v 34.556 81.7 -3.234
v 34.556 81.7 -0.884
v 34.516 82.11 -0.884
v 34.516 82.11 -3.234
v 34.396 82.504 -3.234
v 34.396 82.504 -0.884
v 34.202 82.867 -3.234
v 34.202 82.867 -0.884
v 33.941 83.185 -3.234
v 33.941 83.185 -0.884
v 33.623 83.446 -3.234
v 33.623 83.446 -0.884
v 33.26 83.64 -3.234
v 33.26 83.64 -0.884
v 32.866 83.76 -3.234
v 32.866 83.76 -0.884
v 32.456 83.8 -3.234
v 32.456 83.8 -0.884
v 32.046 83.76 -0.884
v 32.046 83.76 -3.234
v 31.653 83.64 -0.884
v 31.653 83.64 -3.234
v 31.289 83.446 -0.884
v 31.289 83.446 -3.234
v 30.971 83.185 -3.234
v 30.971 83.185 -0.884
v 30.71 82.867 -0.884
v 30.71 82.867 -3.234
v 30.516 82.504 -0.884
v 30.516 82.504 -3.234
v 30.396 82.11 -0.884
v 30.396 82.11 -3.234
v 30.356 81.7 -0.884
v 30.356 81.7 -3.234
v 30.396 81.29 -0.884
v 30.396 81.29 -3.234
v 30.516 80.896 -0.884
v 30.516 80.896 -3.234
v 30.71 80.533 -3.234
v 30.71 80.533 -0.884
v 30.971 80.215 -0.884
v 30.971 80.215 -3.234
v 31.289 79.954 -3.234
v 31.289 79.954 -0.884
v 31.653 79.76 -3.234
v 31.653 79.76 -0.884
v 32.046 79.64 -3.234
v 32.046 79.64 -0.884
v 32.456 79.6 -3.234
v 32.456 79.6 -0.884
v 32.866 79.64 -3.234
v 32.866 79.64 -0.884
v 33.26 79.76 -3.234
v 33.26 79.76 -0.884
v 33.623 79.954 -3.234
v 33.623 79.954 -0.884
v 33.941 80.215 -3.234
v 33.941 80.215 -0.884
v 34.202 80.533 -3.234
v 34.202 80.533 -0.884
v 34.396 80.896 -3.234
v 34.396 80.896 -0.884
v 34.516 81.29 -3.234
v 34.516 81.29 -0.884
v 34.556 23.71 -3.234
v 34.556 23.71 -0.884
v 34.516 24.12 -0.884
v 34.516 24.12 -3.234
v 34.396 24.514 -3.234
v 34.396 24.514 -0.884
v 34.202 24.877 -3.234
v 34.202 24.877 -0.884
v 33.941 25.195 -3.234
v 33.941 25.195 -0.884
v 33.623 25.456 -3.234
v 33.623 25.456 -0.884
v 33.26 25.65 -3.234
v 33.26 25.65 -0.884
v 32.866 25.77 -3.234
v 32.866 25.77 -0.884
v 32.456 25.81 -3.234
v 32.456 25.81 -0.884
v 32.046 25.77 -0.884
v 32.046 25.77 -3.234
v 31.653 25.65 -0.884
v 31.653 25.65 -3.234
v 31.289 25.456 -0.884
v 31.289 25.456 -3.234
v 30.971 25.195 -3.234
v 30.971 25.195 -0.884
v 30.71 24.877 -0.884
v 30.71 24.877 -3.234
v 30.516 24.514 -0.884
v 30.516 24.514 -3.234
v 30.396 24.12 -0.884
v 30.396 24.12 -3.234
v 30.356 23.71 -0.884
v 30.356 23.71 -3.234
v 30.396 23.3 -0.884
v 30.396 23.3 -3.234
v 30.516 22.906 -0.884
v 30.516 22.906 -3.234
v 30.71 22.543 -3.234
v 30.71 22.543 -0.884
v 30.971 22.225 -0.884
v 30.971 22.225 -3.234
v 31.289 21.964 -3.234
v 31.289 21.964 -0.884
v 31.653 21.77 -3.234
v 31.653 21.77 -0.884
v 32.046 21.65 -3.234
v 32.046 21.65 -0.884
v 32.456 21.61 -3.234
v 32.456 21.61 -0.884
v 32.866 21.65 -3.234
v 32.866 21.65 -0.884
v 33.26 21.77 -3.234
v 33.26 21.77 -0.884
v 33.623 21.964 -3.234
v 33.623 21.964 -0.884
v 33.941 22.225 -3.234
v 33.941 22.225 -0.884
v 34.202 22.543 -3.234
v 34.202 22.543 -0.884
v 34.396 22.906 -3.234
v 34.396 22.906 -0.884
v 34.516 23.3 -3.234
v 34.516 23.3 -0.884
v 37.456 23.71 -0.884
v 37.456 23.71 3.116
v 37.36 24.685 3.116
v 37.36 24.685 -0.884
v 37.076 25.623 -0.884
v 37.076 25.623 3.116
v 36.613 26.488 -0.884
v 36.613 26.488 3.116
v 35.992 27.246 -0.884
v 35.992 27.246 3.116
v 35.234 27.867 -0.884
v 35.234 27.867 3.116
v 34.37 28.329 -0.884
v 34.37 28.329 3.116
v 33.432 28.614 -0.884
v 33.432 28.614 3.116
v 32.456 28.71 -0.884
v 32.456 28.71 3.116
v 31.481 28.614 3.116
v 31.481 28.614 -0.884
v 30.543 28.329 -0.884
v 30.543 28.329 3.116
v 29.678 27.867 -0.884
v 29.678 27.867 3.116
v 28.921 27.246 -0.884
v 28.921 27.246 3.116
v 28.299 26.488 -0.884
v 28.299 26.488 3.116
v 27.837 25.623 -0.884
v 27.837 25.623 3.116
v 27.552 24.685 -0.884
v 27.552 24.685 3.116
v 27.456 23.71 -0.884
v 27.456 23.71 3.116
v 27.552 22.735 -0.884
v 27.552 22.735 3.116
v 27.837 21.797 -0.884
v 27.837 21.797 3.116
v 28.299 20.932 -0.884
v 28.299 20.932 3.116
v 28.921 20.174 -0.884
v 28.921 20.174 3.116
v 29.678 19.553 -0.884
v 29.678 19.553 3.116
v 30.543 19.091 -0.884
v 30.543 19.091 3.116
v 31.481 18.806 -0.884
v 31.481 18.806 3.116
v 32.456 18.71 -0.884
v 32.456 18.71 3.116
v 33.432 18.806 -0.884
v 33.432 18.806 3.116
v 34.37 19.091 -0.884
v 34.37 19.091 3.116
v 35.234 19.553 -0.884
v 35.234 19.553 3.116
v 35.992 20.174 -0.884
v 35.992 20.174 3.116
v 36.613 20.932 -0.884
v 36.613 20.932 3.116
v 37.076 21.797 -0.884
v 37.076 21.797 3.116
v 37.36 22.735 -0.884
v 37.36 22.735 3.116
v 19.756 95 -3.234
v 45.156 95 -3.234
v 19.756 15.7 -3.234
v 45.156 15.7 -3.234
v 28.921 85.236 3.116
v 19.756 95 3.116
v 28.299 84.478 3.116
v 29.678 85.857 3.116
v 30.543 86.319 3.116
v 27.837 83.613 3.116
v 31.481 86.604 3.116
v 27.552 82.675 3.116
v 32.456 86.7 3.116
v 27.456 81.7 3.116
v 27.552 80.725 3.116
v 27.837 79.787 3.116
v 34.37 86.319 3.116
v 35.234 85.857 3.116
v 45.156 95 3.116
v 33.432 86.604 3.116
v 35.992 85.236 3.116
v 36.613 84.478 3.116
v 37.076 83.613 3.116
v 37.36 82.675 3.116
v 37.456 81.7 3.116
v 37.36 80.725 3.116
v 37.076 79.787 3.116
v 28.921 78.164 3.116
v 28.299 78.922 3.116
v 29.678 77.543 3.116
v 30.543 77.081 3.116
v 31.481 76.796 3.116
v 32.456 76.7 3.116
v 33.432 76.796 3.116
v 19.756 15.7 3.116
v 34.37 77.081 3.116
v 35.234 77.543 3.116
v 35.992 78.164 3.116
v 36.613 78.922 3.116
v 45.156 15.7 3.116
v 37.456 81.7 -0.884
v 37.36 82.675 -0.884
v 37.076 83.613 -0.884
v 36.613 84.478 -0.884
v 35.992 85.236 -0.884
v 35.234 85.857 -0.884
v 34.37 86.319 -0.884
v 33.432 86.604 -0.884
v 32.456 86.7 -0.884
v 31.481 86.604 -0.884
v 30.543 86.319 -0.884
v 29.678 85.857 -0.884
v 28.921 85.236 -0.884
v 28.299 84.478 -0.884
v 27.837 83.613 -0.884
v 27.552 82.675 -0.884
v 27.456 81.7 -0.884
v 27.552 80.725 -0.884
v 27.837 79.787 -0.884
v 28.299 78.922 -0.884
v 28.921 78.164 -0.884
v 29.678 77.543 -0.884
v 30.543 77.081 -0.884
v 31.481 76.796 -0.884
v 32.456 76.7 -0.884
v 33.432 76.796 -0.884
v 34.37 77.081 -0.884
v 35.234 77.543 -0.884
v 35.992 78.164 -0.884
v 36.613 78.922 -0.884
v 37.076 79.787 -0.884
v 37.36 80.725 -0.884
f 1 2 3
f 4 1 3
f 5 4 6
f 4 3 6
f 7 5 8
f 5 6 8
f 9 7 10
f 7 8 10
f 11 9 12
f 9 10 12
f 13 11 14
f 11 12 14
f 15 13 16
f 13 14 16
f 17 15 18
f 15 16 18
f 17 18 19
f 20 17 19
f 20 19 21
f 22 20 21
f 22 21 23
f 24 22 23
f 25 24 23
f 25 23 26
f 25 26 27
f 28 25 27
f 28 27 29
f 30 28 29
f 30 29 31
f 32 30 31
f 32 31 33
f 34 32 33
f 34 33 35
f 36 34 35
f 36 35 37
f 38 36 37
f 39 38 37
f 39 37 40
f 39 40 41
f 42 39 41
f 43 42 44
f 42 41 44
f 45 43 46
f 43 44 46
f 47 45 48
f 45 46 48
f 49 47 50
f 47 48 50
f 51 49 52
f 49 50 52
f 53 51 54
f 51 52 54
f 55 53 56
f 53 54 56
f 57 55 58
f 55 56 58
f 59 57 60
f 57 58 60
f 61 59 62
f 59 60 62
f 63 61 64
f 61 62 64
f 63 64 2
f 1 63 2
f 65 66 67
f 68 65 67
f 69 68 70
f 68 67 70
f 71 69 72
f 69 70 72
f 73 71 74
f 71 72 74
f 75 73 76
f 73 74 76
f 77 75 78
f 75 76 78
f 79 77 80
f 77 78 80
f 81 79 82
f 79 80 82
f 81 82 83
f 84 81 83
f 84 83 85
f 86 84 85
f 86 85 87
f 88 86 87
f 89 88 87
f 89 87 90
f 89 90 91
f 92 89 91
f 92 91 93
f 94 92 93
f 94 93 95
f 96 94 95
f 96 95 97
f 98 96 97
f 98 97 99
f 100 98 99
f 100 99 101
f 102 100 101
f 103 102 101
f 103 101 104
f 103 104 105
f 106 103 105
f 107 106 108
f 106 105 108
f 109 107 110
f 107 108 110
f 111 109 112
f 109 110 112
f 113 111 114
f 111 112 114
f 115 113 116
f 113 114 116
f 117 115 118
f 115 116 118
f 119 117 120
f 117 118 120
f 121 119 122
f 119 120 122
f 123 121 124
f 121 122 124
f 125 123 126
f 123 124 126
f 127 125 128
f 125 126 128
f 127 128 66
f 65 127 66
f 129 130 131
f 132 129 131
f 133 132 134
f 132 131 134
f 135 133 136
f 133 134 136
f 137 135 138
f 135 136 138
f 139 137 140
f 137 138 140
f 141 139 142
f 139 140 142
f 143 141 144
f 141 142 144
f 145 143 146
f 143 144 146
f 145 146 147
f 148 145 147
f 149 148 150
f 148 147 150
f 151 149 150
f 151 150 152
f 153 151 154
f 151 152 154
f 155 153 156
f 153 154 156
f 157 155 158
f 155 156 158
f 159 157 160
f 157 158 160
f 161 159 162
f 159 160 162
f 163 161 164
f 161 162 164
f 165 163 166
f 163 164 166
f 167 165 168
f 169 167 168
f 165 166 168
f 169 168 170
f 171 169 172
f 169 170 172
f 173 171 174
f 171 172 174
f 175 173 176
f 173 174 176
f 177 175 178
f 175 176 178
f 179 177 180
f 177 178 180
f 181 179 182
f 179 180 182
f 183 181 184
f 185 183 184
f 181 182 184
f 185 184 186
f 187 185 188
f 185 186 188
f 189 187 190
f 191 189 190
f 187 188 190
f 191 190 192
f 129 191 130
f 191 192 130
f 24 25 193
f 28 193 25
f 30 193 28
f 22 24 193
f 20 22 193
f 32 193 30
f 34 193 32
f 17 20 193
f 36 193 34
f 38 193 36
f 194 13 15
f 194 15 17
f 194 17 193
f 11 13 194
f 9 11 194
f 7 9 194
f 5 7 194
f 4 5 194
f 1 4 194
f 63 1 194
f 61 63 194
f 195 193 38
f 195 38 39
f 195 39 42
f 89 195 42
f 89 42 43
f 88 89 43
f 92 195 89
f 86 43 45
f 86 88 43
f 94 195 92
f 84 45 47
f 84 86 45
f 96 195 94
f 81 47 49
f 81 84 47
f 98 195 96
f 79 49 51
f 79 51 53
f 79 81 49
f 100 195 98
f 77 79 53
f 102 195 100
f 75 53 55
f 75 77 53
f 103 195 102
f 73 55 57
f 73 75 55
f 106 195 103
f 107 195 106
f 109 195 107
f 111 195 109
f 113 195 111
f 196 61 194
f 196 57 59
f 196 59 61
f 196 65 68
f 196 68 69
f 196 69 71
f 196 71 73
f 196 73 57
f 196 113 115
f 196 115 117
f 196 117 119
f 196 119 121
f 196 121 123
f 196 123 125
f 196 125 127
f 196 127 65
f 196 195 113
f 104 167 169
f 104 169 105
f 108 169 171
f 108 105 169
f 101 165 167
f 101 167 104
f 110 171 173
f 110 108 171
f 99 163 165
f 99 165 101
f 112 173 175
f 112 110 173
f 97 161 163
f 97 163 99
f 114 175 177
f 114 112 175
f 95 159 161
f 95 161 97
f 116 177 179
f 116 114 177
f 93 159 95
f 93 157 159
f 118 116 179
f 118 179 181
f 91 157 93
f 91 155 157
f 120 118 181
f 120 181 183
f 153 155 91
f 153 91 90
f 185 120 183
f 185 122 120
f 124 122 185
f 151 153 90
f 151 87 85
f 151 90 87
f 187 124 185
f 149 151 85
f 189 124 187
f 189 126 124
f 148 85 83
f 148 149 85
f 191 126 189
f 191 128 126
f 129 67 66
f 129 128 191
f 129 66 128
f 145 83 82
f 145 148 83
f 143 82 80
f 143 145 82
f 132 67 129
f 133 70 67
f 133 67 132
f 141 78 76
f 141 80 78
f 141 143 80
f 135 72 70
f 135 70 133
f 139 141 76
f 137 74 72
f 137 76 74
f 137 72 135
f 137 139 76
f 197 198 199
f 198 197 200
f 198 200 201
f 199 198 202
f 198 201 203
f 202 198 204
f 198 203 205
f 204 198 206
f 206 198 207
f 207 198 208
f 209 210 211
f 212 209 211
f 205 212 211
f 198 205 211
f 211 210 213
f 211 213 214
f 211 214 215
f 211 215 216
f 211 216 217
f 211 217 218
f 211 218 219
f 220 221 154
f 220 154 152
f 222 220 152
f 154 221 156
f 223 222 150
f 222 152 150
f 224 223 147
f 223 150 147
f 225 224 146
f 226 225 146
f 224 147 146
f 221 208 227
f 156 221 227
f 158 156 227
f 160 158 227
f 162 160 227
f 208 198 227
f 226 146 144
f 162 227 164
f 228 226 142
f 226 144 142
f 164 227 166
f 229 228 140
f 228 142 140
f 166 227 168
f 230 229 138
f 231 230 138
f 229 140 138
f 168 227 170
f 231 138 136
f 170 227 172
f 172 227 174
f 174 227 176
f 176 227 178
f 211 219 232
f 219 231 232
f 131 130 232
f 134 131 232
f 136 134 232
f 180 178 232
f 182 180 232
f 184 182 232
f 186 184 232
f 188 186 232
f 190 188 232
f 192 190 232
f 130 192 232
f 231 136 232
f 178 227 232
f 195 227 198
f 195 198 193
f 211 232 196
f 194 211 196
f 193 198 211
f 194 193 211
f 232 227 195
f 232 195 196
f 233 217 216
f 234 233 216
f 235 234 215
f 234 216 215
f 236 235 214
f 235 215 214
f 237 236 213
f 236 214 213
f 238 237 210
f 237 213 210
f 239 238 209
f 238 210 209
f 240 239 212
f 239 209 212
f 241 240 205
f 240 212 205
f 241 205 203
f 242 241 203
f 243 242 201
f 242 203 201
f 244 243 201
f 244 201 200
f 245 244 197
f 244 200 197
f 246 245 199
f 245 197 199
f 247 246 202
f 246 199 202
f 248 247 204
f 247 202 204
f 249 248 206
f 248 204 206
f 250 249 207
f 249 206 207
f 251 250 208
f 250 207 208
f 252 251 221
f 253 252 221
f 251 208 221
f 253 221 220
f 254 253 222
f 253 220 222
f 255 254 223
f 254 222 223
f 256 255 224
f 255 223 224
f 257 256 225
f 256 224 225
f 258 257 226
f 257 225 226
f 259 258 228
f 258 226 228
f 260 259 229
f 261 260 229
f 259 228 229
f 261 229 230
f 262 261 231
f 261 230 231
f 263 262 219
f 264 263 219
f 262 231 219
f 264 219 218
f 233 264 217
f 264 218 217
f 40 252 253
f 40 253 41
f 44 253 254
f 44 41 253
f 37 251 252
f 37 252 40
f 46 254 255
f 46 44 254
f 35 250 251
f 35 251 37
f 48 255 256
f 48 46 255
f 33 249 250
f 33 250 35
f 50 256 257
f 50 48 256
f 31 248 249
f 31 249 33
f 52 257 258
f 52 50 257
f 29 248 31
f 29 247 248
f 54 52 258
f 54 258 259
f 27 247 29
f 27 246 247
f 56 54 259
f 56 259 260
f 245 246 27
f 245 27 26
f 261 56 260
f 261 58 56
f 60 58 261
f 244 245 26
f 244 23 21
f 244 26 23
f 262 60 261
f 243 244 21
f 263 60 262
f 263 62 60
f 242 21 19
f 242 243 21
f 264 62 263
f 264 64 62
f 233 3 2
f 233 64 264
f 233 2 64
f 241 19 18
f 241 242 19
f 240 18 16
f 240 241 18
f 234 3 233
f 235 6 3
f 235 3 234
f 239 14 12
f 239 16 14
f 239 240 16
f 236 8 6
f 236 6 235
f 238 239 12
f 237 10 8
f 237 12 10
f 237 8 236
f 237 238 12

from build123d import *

# Parameters (mm, degrees)
SKETCH1_W           = 25.4
SKETCH1_H           = 6.35
BOSS_EXTRUDE1_DEPTH = 100
SKETCH2_R           = 2.1
CUT_EXTRUDE1_DEPTH  = 110.906322202
SKETCH2_3_R         = 5
CUT_EXTRUDE2_DEPTH  = 4
SKETCH2_4_R         = 5
CUT_EXTRUDE3_DEPTH  = 4
SKETCH5_W           = 25.4
SKETCH5_H           = 5
SKETCH5_H_2         = 12
CUT_EXTRUDE4_DEPTH  = 110.906322202
SKETCH6_W           = 25.4
SKETCH6_H           = 3.7
CUT_EXTRUDE5_DEPTH  = 106.377415322


with BuildPart() as part:
    # Sketch1 → Boss-Extrude1 (new body)
    with BuildSketch(Plane(origin=(0, 0, 0), x_dir=(1, 0, 0), z_dir=(0, 1, 0))):
        with Locations((32.456141995, 0.058688594)):
            Rectangle(SKETCH1_W, SKETCH1_H)
    extrude(amount=BOSS_EXTRUDE1_DEPTH)

    # Sketch2 → Cut-Extrude1 (cut, through all)
    with BuildSketch(Plane.XY.offset(3.116311406)):
        with Locations((32.456141995, 81.7)):
            Circle(SKETCH2_R)
        with Locations((32.456141995, 23.71)):
            Circle(SKETCH2_R)
    extrude(amount=-CUT_EXTRUDE1_DEPTH, mode=Mode.SUBTRACT)

    # Sketch2<3> → Cut-Extrude2 (cut)
    with BuildSketch(Plane.XY.offset(3.116311406)):
        with Locations((32.456141995, 81.7)):
            Circle(SKETCH2_3_R)
    extrude(amount=-CUT_EXTRUDE2_DEPTH, mode=Mode.SUBTRACT)

    # Sketch2<4> → Cut-Extrude3 (cut)
    with BuildSketch(Plane.XY.offset(3.116311406)):
        with Locations((32.456141995, 23.71)):
            Circle(SKETCH2_4_R)
    extrude(amount=-CUT_EXTRUDE3_DEPTH, mode=Mode.SUBTRACT)

    # Sketch5 → Cut-Extrude4 (cut, through all)
    with BuildSketch(Plane.XY.offset(3.116311406)):
        with Locations((32.456141995, 97.5)):
            Rectangle(SKETCH5_W, SKETCH5_H)
        with Locations((32.456141995, 6)):
            Rectangle(SKETCH5_W, SKETCH5_H_2)
    extrude(amount=-CUT_EXTRUDE4_DEPTH, mode=Mode.SUBTRACT)

    # Sketch6 → Cut-Extrude5 (cut, through all)
    with BuildSketch(Plane.XY.offset(3.116311406)):
        with Locations((32.456141995, 13.85)):
            Rectangle(SKETCH6_W, SKETCH6_H)
    extrude(amount=-CUT_EXTRUDE5_DEPTH, mode=Mode.SUBTRACT)


solid = part.part
